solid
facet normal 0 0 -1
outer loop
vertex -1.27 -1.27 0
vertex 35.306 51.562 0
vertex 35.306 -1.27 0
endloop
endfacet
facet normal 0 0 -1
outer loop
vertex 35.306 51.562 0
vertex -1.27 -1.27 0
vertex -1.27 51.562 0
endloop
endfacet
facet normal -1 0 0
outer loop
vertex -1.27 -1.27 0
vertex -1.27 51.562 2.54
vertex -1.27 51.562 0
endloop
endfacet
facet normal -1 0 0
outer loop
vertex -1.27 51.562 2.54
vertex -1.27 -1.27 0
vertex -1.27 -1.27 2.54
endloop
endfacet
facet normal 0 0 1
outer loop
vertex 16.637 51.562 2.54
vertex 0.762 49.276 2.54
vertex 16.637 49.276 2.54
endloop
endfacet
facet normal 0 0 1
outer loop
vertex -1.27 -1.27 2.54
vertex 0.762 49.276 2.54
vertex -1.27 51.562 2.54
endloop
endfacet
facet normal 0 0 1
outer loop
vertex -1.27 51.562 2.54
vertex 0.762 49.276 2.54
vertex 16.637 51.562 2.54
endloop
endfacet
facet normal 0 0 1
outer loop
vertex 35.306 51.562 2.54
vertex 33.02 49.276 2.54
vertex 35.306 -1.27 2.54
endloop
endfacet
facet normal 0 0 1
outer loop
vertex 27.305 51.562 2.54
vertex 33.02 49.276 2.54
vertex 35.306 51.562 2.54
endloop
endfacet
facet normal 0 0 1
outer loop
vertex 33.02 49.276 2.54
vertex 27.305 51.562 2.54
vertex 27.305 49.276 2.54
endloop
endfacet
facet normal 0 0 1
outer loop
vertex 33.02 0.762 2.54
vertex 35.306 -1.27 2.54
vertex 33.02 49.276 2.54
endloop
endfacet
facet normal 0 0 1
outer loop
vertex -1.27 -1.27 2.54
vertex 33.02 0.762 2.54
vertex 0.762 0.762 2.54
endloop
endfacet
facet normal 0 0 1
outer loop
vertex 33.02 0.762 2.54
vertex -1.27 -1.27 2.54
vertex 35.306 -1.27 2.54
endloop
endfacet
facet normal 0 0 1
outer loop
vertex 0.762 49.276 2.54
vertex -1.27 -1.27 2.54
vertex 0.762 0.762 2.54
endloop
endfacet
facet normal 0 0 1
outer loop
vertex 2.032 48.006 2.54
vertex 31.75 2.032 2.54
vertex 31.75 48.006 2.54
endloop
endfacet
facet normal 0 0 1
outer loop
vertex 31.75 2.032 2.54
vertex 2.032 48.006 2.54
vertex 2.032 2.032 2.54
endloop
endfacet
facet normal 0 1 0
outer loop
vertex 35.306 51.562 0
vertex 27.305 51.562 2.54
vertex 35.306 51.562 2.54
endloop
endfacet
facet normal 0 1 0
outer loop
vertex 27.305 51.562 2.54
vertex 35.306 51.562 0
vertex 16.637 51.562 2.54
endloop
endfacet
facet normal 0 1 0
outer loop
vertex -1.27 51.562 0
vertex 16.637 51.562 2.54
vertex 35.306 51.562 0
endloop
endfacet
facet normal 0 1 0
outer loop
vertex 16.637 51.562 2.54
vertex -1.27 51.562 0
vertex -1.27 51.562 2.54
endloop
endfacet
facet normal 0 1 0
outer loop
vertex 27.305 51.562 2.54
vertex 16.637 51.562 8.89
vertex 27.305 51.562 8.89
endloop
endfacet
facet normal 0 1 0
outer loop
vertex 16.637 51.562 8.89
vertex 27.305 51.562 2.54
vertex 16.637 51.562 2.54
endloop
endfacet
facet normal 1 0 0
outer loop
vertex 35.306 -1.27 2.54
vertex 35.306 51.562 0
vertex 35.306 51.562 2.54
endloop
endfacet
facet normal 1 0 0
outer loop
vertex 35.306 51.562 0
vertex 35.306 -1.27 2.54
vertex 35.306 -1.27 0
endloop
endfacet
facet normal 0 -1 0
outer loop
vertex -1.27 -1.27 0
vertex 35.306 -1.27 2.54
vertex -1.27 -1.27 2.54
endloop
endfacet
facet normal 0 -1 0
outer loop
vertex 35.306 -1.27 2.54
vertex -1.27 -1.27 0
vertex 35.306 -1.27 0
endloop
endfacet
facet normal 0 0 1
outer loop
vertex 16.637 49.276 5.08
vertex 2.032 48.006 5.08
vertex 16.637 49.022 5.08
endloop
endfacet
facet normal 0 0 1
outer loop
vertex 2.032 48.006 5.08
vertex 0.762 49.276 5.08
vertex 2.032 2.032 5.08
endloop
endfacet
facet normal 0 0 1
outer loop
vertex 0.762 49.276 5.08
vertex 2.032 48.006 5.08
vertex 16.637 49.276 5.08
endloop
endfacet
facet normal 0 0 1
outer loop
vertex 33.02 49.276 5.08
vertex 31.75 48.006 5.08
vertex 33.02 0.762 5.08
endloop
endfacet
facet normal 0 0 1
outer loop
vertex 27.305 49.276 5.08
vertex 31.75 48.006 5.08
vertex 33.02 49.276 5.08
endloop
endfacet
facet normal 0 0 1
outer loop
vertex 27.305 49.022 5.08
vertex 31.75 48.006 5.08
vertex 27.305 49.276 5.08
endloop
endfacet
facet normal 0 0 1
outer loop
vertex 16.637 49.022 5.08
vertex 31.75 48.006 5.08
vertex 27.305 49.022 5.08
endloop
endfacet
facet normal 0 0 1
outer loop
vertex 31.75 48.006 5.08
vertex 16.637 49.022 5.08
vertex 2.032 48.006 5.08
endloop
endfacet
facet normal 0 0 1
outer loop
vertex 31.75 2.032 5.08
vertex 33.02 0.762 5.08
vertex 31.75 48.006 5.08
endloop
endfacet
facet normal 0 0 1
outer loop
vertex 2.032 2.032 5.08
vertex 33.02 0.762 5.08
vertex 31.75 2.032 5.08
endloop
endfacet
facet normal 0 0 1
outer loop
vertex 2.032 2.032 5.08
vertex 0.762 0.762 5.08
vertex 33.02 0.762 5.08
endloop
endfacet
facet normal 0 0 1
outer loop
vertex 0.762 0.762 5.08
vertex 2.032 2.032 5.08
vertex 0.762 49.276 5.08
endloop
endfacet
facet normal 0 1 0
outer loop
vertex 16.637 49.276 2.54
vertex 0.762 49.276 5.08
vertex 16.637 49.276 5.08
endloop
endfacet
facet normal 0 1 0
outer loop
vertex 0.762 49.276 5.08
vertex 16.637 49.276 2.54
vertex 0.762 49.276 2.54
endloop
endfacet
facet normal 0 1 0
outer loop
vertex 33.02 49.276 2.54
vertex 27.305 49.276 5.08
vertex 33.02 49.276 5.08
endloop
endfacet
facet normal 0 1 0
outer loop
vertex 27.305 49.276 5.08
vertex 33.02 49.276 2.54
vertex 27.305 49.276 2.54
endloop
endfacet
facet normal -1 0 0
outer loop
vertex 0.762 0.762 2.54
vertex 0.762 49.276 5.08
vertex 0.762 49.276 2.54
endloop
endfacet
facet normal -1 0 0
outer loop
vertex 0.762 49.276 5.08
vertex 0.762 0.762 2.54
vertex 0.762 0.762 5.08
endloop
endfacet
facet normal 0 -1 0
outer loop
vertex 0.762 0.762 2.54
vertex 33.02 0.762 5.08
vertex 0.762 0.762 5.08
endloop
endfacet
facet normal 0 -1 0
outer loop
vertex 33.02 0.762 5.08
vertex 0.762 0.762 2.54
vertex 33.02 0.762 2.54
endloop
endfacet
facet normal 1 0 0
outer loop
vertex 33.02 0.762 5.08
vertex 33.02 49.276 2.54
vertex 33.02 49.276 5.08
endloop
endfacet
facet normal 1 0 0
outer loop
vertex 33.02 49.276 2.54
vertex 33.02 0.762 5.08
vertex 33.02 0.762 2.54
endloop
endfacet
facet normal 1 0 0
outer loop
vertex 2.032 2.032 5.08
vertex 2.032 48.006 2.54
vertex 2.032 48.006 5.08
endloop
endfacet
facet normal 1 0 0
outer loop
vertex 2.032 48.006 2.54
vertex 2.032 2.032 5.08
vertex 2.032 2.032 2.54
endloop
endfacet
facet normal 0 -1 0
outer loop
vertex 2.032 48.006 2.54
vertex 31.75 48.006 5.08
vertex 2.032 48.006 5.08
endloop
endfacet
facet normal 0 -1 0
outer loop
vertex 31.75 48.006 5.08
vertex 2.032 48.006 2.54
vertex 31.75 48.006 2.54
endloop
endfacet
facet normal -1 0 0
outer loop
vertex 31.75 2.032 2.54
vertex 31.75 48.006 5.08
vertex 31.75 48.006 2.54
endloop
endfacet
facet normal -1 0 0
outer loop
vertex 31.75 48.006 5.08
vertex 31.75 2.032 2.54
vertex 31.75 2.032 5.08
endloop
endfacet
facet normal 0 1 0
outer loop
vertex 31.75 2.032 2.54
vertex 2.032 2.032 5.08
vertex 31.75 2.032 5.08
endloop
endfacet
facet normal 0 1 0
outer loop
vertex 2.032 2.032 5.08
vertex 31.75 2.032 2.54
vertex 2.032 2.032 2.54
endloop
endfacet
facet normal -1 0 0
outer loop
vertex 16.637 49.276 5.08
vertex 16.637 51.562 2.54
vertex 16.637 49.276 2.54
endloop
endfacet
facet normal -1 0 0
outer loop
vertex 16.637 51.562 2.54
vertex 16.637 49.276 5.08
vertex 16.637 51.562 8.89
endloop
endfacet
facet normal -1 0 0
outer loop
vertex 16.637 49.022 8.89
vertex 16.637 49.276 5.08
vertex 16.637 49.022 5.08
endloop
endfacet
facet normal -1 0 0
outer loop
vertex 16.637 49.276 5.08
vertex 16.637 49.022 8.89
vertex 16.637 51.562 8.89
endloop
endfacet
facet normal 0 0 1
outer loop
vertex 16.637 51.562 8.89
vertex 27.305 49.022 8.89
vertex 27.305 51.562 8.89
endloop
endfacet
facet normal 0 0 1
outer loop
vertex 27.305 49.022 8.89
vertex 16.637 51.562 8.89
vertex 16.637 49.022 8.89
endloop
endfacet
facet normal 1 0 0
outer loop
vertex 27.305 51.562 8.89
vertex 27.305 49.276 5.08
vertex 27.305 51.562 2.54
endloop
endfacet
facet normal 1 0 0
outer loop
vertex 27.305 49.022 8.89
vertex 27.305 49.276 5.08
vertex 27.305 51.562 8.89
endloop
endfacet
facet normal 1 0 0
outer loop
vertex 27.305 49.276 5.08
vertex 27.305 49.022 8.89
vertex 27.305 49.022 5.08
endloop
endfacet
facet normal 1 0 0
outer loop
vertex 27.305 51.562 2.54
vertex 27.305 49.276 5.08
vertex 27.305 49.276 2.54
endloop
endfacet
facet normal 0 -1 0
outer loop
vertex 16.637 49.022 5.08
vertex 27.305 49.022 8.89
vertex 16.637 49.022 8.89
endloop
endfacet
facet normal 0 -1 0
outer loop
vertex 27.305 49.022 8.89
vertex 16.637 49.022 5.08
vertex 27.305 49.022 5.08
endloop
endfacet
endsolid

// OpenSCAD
ViewScale = [0.0254, 0.0254, 0.0254];

module top()
{
    difference() {
    square([1340, 1980+40]);
    // pot cutout
    translate([265, 1980-600-40, 0])
    circle(320/2);

    // power connector cutout
    translate([690-45, 1980-420, 0])
    square([440, 470]);
    // big LED cutout
    translate([930+50, 620-40, 0])
    circle(250/2);
    // small LED cutout
    translate([930+50, 1100+50, 0])
    circle(170/2);

    // Hall Effect Sensor cutout
    translate([960, 780, 0])
    square([130, 220]);

    // Magnet wire cutouts
    translate([725, 250, 0])
    circle(120/2);
    translate([725+390, 250, 0])
    circle(120/2);
    }
}

module standoffs()
{
    translate([0, 0, -470])
    linear_extrude(470) {
    // thick standoffs
    translate([170, 300, 0])
    circle(240/2);
    translate([170, 1780+50-20, 0])
    circle(240/2);
    // small stands
    translate([1260-70, 100-100, 0])
    square([150, 150]);
    translate([1260-70, 1900-70, 0])
    square([150, 150]);
    }
    
    // boards holes
    translate([0, 0, -570])
    linear_extrude(100) {
    translate([170, 300, 0])
    circle(120/2);
    translate([170, 1780+50-20, 0])
    circle(120/2);
    }

    // LED hole collars
    translate([50, 0, -270])
    linear_extrude(300) {
    // big LED cutout
    translate([930, 620-40, 0])
    difference() {
    circle(350/2);
    circle(250/2);
    }
    // small LED cutout
    translate([930, 1100+50, 0])
    difference() {
    circle(270/2);
    circle(170/2);
    }
    }
}

module sides()
{
    // not cutout
//    translate([-50, -50, -470-200])
//    linear_extrude(520-30)
//    difference() {
//    square([1440, 2080]);
//    translate([50, 50, 0])
//    square([1340, 1980]);
//    }

    // cutout
    translate([-50, -50, -730])
    linear_extrude(780)
    difference() {
    square([1440, 2080]);
    translate([50, 50, 0])
    square([1340, 1980]);
    // power connector cutout
    translate([690-45+50, 1980-420, 0])
    square([440, 520]);

    // big LED cutout
    translate([740, 1980-420, 0])
    square([350, 620]);
    }
}

module lid()
{
    translate([-50, -50, 0]) {
        linear_extrude(100)
        square([1440, 2080]);

        translate([80, 80, 100]) {
        linear_extrude(100)
        difference() {
                square([1270, 1910]);
                translate([50, 50, 0])
                square([1170, 1810]);
            }
        }
        linear_extrude(350)
        translate([1440-390-690/2, 2080-100, 0])
        square([420, 100]);
    }
}

scale(ViewScale)
{
//    linear_extrude(50)
//    top();
//    standoffs();
//    sides();
//    translate([0, 0, -900])
    lid();
}
